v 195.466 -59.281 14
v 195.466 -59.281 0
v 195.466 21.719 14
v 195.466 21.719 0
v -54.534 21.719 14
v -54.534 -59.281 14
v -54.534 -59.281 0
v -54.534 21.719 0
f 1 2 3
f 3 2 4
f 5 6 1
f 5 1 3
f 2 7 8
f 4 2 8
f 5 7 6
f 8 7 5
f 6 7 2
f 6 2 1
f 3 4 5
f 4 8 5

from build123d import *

# Parameters (mm, degrees)
F0_W     = 188
F0_H     = 82
F1_DEPTH = 14
F2_W     = 188
F2_H     = 14
F3_DEPTH = 1
F4_DEPTH = 62


with BuildPart() as f1:
    # F0 (on Top) → F1 (new body)
    with BuildSketch(Plane.XY):
        with Locations((39.4660490155, -19.2813288569)):
            Rectangle(F0_W, F0_H)
    extrude(amount=F1_DEPTH)

    # F2 (on face) → F3 (cut)
    with BuildSketch(Plane.XZ.offset(60.2813288569)):
        with Locations((39.4660490155, 7)):
            Rectangle(F2_W, F2_H)
    extrude(amount=-F3_DEPTH, mode=Mode.SUBTRACT)

    # F4 (add): a face of the model
    f4_faces = [f1.faces().sort_by_distance(p)[0] for p in [
        (133.4660490155, -18.7813288569, 7),
    ]]
    extrude(f4_faces, amount=F4_DEPTH)


solid = f1.part
